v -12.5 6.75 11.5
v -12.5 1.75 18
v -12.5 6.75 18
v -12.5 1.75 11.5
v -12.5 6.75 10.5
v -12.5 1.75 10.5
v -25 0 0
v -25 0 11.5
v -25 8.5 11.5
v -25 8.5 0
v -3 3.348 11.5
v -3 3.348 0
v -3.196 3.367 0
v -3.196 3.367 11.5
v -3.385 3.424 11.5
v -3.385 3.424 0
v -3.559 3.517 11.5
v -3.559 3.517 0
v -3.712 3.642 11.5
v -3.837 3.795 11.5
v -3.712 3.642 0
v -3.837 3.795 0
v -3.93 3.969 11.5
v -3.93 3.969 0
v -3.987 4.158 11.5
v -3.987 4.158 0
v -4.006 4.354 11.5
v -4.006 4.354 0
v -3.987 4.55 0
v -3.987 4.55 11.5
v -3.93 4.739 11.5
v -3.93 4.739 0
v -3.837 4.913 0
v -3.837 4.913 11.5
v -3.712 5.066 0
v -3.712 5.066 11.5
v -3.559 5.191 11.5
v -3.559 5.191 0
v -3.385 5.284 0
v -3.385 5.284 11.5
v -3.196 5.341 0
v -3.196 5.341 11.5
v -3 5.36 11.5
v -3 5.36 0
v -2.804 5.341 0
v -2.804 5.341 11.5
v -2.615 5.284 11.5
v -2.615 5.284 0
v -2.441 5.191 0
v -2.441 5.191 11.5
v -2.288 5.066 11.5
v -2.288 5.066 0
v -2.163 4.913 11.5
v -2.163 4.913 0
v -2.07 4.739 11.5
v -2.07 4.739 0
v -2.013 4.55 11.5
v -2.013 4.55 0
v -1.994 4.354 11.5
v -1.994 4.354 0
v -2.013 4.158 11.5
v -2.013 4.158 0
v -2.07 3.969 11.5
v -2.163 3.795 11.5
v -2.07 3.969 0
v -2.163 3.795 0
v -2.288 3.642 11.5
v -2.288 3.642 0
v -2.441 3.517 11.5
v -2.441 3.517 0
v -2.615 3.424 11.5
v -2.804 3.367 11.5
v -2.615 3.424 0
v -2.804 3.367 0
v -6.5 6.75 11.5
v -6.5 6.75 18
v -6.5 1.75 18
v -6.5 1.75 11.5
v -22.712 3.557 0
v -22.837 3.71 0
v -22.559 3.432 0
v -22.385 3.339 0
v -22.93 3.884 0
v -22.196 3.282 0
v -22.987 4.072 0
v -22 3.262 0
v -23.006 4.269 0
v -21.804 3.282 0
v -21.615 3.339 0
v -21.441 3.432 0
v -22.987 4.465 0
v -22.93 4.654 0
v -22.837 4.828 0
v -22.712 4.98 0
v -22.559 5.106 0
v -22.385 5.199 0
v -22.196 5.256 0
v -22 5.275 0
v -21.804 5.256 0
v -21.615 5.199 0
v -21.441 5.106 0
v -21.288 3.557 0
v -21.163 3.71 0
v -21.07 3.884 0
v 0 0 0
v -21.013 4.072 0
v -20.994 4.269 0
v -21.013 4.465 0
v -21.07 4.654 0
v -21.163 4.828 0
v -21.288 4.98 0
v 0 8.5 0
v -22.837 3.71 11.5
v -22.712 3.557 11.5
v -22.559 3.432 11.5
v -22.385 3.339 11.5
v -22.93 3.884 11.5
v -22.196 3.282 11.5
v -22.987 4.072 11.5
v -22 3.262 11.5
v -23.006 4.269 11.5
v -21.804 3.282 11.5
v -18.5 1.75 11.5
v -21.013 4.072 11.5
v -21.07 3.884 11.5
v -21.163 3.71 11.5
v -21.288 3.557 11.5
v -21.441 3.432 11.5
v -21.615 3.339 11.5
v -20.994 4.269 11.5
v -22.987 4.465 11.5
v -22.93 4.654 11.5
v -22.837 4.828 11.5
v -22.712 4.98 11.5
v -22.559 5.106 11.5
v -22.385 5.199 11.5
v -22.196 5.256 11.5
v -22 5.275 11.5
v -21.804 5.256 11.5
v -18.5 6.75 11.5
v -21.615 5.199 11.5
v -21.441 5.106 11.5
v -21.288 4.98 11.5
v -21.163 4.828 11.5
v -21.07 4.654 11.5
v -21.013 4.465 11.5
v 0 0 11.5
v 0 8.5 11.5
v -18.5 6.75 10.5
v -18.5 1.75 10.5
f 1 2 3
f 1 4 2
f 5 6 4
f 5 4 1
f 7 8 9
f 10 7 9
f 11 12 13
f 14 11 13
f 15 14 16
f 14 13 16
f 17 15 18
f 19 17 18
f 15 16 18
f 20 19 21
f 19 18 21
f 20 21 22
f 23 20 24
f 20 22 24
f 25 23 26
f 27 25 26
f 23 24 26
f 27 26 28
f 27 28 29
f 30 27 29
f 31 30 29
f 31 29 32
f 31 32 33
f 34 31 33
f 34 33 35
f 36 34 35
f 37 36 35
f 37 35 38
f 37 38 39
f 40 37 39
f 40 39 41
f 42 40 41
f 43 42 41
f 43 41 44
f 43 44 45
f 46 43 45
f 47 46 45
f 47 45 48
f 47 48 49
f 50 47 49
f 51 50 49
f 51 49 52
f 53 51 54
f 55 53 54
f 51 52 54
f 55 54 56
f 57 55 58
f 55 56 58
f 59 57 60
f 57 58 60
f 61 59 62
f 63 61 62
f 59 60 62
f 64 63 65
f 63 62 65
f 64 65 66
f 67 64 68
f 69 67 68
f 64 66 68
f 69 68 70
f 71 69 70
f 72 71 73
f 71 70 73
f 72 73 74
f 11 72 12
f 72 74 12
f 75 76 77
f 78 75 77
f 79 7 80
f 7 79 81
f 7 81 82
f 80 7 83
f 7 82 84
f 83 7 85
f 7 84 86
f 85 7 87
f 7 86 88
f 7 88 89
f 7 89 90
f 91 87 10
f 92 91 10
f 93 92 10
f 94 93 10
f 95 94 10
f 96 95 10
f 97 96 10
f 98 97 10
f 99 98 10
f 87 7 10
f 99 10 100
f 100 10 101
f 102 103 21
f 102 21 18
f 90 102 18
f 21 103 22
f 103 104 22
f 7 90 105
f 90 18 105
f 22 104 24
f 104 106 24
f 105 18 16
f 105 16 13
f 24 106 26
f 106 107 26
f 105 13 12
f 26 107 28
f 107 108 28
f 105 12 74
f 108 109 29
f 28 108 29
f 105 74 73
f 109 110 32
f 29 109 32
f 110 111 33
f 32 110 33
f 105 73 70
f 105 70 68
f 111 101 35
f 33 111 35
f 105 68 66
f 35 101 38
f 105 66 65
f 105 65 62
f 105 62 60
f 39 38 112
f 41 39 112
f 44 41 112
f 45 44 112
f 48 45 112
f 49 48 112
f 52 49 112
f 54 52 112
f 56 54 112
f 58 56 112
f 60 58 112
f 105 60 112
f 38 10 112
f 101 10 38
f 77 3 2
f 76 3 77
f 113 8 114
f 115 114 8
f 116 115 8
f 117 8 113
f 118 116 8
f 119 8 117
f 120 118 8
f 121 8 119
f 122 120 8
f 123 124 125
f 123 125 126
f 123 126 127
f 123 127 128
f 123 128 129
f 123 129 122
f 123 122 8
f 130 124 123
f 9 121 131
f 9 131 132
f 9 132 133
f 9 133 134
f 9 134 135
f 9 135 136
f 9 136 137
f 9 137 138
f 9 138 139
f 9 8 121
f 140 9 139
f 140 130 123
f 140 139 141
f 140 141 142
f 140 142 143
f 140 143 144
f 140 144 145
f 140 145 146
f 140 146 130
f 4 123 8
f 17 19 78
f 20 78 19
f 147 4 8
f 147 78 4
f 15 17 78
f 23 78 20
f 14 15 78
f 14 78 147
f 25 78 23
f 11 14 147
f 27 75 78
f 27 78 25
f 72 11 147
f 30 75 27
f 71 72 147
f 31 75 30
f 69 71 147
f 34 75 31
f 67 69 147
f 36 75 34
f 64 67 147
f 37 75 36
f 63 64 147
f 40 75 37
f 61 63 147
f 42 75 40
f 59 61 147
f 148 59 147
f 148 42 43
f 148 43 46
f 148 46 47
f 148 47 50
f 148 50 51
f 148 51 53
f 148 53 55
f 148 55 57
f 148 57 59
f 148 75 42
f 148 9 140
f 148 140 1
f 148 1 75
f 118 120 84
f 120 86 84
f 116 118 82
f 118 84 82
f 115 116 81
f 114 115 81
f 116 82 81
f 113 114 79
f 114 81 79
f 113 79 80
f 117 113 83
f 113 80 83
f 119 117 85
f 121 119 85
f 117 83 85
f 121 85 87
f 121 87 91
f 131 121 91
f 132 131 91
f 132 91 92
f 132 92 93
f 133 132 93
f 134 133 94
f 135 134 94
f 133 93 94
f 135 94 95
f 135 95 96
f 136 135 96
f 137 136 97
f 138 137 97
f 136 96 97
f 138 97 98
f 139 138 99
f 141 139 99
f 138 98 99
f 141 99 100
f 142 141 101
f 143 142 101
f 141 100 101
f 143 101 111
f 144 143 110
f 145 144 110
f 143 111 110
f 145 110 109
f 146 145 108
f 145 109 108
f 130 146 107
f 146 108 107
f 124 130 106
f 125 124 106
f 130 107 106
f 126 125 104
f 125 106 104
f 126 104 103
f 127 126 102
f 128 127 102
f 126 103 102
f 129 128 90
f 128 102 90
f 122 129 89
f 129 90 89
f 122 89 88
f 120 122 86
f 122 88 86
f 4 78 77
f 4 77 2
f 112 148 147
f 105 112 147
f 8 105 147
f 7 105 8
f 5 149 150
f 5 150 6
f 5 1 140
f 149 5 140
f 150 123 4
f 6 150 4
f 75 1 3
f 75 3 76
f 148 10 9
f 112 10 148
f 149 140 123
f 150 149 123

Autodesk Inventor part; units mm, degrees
ref_plane "Plan YZ" through (0, 0, 0) normal (1, 0, 0) x (0, 1, 0)
ref_plane "Plan XZ" through (0, 0, 0) normal (0, 1, 0) x (-1, 0, 0)
ref_plane "Plan XY" through (0, 0, 0) normal (0, 0, 1) x (1, 0, 0)
sketch "Esquisse1" plane through (0, 0, 0) normal (0, 0, 1) x (1, 0, 0)
  line L0 (0, 0) -> (-25, 0)
  line L1 (-25, 0) -> (-25, 8.5)
  line L2 (-25, 8.5) -> (0, 8.5)
  line L3 (0, 8.5) -> (0, 0)
  dimension "d0" = 25
  dimension "d1" = 8.5
extrude "Extrusion1" add sketch "Esquisse1" along normal blind 11.5
sketch "Esquisse6" plane through (0, 0, 11.5) normal (0, 0, 1) x (1, 0, 0)
  line L0 (-18.5, 1.75) -> (-6.5, 1.75)
  line L1 (-6.5, 1.75) -> (-6.5, 6.75)
  line L2 (-6.5, 6.75) -> (-18.5, 6.75)
  line L3 (-18.5, 6.75) -> (-18.5, 1.75)
  line L4 (-6.5, 4.25) -> (0, 4.25) construction
  line L5 (0, 0) -> (0, 8.5) projected
  line L6 (-25, 4.25) -> (-18.5, 4.25) construction
  line L7 (-25, 8.5) -> (-25, 0) construction
  line L8 (-21.7955, 8.5) -> (-21.7955, 6.75) construction
  line L9 (-18.2379, 0) -> (-18.2379, 1.75) construction
  line L10 (-25, 0) -> (0, 0) construction
  line L11 (0, 8.5) -> (-25, 8.5) construction
  dimension "d4" = 5
  dimension "d5" = 12
extrude "Extrusion2" cut sketch "Esquisse6" against normal blind 1
sketch "Esquisse7" plane through (0, 0, 10.5) normal (0, 0, 1) x (1, 0, 0)
  line L0 (-6.5, 1.75) -> (-12.5, 1.75)
  line L1 (-12.5, 1.75) -> (-12.5, 6.75)
  line L2 (-12.5, 6.75) -> (-6.5, 6.75)
  line L3 (-6.5, 6.75) -> (-6.5, 1.75)
  line L4 (-6.5, 1.75) -> (-18.5, 1.75) projected
  line L5 (-18.5, 6.75) -> (-6.5, 6.75) projected
  line L6 (-6.5, 6.75) -> (-6.5, 1.75) projected
  point P0 (0, 0)
  dimension "d8" = 6
extrude "Extrusion3" add sketch "Esquisse7" along normal blind 7.5
sketch "Esquisse8" plane through (0, 0, 11.5) normal (0, 0, 1) x (1, 0, 0)
  line L0 (-3, 4.354) -> (-3, 0.0702) construction
  line L1 (-3, 8.6378) -> (-3, 4.354) construction
  line L2 (0, 0) -> (0, 8.5) construction
  dimension "d18" = 3
hole "Perçage1" at (-3, 4.354, 11.5) direction (0, 0, -1) diameter 2.013 end through all thread size "M2.5x0.45" class "6H" standard "ISO M"
sketch "Esquisse9" plane through (0, 0, 11.5) normal (0, 0, 1) x (1, 0, 0)
  line L0 (-25, 8.5) -> (-25, 0) projected
  line L1 (-22, 0.0375) -> (-22, 4.2687) construction
  line L2 (-22, 4.2687) -> (-22, 8.5) construction
  line L3 (0, 8.5) -> (-25, 8.5) construction
  point P0 (0, 0)
  dimension "d26" = 3
hole "Perçage2" at (-22, 4.2687, 11.5) direction (0, 0, -1) diameter 2.013 end through all thread size "M2.5x0.45" class "6H" standard "ISO M"
properties part number "P1704_013_Switch" material "."
